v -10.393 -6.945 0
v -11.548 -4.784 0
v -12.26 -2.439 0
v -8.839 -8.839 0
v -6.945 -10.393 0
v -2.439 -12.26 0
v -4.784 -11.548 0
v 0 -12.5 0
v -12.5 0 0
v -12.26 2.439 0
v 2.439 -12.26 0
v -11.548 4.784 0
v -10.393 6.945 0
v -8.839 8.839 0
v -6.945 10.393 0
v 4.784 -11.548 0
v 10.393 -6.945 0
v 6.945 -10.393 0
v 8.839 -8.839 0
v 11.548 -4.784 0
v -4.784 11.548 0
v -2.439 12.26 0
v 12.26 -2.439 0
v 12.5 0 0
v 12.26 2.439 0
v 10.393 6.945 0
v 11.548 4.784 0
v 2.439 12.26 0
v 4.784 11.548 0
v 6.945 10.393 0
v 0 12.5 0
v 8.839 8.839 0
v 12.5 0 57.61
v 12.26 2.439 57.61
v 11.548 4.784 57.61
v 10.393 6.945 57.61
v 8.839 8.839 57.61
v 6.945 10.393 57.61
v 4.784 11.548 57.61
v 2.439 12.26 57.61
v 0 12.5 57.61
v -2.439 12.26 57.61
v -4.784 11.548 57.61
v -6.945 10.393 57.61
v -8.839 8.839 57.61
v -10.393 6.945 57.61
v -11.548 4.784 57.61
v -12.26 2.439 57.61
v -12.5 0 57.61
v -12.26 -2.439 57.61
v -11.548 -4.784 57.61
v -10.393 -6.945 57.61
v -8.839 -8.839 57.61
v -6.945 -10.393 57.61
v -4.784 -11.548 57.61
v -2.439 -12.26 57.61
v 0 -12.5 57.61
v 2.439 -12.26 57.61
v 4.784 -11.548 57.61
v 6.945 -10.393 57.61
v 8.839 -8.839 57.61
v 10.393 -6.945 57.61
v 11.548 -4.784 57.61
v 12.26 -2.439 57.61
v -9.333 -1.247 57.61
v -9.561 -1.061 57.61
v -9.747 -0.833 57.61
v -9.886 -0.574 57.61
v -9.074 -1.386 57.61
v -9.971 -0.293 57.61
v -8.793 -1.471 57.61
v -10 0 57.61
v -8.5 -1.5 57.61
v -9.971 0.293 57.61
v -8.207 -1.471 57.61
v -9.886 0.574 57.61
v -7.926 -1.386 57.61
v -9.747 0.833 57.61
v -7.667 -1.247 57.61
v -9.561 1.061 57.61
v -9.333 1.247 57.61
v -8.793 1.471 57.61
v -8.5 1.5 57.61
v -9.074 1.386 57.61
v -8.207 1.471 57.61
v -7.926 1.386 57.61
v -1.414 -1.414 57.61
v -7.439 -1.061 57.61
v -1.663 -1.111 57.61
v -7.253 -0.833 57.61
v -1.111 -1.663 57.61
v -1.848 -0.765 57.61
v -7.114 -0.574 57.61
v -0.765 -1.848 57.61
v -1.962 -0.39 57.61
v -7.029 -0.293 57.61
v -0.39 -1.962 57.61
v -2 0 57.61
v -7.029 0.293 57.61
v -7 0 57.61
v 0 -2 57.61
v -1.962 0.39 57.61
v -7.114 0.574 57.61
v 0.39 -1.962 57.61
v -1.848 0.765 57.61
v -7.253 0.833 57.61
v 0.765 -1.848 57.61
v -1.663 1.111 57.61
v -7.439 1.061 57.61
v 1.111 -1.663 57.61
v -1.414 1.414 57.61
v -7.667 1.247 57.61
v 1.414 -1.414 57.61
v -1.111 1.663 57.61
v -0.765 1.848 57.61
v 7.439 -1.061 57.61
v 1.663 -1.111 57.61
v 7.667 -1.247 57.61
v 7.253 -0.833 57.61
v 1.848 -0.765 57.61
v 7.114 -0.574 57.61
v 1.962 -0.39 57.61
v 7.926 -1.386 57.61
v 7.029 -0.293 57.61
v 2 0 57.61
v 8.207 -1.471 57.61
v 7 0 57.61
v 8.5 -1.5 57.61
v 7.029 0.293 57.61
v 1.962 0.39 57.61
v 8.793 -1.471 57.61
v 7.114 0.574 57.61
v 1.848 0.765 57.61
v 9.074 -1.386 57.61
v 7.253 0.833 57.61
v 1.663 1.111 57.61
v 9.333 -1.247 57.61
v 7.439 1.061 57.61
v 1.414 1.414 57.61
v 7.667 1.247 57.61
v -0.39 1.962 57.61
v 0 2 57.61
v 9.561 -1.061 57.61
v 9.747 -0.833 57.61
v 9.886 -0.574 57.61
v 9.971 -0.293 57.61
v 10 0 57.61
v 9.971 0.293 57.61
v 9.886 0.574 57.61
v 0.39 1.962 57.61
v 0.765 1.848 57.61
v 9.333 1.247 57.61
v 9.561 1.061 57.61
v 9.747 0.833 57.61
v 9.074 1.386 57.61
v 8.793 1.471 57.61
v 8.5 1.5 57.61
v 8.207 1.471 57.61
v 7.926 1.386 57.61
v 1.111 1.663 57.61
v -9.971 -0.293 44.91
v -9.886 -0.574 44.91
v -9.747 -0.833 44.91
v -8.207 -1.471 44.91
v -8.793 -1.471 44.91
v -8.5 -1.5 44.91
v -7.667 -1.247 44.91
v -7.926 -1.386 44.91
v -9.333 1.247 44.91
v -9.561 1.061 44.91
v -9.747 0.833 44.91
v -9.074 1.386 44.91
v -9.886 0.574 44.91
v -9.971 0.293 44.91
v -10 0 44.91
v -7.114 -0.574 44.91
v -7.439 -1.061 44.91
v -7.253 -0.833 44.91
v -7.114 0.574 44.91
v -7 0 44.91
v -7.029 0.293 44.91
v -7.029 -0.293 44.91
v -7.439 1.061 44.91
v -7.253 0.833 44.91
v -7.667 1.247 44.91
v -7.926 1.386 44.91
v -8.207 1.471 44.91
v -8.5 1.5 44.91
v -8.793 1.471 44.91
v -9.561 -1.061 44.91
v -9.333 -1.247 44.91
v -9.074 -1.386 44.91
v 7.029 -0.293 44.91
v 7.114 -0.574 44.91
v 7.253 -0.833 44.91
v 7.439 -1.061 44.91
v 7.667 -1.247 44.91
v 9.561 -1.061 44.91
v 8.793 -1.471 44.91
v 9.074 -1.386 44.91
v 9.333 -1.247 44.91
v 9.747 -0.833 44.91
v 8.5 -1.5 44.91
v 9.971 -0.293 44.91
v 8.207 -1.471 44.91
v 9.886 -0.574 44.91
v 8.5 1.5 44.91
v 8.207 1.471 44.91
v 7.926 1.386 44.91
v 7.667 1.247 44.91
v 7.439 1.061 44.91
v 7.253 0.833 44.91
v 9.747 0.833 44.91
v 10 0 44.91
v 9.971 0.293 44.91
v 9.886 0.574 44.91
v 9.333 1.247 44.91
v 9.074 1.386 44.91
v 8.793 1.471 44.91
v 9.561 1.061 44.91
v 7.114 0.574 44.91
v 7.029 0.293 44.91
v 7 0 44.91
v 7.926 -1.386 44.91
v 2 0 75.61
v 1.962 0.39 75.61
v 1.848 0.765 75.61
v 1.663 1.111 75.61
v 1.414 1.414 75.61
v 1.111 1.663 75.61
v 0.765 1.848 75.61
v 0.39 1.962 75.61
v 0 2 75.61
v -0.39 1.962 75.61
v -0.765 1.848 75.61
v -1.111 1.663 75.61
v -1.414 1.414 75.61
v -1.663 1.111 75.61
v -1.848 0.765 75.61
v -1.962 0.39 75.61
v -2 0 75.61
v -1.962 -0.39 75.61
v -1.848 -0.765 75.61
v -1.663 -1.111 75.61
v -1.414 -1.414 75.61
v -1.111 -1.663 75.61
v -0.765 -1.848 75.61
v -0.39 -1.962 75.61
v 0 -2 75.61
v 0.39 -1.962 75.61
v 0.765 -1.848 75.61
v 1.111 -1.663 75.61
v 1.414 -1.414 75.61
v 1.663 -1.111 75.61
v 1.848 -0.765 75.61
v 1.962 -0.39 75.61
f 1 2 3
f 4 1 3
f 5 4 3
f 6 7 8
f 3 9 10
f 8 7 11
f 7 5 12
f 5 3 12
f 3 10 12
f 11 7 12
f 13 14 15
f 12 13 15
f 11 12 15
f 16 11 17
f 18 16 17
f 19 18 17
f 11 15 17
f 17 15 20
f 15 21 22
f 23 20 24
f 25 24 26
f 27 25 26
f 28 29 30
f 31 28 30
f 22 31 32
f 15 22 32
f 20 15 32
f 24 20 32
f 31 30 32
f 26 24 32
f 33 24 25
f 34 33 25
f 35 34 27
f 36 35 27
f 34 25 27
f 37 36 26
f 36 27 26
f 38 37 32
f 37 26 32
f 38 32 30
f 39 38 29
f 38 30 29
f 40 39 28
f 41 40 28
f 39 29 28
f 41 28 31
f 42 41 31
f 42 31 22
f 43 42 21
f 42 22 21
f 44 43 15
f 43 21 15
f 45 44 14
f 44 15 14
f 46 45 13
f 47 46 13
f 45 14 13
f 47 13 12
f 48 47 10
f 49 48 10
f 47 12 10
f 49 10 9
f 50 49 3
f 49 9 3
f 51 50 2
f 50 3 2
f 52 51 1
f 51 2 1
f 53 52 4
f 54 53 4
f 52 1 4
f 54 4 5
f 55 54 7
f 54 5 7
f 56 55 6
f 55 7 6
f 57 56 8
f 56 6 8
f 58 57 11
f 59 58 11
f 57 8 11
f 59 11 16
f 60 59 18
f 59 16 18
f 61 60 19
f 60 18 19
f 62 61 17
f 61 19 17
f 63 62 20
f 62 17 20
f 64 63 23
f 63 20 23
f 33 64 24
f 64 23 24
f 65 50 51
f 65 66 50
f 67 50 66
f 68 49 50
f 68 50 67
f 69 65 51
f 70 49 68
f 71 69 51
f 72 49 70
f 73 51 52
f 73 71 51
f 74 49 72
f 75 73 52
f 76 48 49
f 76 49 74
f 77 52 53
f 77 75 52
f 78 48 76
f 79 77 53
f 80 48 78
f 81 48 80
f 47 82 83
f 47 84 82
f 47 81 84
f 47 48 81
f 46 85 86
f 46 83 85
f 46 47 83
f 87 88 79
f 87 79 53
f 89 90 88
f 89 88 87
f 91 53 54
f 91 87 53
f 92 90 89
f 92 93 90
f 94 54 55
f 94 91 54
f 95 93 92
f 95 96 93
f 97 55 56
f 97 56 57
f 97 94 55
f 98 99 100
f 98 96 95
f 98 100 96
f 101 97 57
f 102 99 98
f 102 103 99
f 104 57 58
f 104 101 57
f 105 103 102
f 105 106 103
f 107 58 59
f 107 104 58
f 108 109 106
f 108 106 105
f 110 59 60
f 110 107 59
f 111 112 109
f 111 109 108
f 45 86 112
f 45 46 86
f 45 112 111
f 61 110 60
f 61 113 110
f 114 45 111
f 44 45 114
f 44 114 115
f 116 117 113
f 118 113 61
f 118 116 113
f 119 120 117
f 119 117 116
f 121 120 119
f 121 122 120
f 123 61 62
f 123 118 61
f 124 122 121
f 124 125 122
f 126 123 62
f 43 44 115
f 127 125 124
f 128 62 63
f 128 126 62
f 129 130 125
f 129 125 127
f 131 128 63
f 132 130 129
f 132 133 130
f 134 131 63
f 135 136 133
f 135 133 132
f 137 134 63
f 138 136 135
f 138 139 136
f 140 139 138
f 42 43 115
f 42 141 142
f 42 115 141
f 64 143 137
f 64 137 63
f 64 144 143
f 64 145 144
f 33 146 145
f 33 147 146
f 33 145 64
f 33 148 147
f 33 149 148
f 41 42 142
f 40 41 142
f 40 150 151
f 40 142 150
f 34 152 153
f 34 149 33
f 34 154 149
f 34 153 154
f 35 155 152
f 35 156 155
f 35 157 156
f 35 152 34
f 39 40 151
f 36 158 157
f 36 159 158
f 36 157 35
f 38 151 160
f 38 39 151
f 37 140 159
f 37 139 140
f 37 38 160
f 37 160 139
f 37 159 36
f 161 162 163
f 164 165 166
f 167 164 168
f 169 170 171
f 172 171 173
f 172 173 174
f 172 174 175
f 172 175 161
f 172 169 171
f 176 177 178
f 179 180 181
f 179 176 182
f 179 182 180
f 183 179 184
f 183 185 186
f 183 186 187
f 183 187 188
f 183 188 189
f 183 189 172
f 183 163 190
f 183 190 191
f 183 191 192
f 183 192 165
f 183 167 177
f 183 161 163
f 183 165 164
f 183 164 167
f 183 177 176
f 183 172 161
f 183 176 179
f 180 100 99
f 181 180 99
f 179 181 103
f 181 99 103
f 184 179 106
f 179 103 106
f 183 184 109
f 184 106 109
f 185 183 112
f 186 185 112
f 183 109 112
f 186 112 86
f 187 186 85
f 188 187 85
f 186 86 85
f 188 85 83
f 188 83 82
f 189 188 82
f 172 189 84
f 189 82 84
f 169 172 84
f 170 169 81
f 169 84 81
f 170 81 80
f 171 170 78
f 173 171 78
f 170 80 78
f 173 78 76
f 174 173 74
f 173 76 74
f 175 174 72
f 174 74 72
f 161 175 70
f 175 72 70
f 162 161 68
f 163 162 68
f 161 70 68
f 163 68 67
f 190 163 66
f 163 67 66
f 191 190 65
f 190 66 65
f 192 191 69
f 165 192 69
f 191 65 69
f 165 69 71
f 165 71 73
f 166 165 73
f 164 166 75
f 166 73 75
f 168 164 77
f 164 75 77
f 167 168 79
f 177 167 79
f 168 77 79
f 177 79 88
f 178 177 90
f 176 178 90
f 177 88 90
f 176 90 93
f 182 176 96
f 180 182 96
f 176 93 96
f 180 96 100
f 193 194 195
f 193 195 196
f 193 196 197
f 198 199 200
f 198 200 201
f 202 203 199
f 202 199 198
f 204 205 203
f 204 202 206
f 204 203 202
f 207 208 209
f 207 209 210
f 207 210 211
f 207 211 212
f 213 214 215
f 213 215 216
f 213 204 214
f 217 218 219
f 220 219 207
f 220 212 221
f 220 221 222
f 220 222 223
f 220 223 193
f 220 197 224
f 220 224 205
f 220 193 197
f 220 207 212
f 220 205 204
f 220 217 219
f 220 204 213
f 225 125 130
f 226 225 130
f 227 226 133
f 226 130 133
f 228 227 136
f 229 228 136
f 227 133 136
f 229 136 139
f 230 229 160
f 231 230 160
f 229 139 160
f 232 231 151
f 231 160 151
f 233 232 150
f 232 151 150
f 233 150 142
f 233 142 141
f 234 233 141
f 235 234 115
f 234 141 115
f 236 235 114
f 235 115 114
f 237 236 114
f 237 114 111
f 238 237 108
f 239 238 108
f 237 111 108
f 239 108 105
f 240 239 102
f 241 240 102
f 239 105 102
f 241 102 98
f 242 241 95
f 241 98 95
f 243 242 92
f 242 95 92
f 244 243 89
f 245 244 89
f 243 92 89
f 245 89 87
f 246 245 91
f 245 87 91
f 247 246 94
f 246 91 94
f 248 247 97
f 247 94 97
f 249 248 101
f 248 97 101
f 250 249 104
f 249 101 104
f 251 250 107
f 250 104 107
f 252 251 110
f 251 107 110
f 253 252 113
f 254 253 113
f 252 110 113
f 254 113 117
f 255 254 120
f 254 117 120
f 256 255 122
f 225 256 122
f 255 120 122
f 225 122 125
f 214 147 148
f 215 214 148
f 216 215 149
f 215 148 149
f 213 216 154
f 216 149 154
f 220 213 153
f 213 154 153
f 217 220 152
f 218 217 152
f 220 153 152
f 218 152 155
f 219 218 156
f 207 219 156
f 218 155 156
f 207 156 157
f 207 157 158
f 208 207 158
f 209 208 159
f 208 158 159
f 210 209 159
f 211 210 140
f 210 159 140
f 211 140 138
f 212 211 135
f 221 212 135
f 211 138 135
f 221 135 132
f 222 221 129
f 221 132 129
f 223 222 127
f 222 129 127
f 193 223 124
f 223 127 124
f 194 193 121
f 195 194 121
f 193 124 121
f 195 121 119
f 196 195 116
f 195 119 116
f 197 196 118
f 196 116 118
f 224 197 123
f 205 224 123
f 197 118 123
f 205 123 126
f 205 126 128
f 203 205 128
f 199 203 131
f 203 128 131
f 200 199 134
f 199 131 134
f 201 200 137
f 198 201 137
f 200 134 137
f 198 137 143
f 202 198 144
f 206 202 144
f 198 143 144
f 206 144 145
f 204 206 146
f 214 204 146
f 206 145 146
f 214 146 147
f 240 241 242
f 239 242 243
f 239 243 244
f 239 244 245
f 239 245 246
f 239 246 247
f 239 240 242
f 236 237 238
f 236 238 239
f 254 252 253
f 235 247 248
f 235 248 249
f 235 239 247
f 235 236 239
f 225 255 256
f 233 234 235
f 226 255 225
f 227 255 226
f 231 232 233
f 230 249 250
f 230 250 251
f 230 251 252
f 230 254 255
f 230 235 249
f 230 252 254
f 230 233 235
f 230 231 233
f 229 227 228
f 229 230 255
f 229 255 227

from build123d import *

# Parameters (mm, degrees)
F0_R     = 12.5
F1_DEPTH = 57.61
F2_R     = 2
F3_DEPTH = 18
F4_R     = 1.5
F5_DEPTH = 12.7


with BuildPart() as f1:
    # F0 (on Top) → F1 (new body)
    with BuildSketch(Plane.XY):
        Circle(F0_R)
    extrude(amount=F1_DEPTH)

    # F2 (on face) → F3 (join)
    with BuildSketch(Plane.XY.offset(57.61)):
        Circle(F2_R)
    extrude(amount=F3_DEPTH)

    # F4 (on face) → F5 (cut)
    with BuildSketch(Plane.XY.offset(57.61)):
        with Locations((-8.5, 0)):
            Circle(F4_R)
        with Locations((8.5, 0)):
            Circle(F4_R)
    extrude(amount=-F5_DEPTH, mode=Mode.SUBTRACT)


solid = f1.part
